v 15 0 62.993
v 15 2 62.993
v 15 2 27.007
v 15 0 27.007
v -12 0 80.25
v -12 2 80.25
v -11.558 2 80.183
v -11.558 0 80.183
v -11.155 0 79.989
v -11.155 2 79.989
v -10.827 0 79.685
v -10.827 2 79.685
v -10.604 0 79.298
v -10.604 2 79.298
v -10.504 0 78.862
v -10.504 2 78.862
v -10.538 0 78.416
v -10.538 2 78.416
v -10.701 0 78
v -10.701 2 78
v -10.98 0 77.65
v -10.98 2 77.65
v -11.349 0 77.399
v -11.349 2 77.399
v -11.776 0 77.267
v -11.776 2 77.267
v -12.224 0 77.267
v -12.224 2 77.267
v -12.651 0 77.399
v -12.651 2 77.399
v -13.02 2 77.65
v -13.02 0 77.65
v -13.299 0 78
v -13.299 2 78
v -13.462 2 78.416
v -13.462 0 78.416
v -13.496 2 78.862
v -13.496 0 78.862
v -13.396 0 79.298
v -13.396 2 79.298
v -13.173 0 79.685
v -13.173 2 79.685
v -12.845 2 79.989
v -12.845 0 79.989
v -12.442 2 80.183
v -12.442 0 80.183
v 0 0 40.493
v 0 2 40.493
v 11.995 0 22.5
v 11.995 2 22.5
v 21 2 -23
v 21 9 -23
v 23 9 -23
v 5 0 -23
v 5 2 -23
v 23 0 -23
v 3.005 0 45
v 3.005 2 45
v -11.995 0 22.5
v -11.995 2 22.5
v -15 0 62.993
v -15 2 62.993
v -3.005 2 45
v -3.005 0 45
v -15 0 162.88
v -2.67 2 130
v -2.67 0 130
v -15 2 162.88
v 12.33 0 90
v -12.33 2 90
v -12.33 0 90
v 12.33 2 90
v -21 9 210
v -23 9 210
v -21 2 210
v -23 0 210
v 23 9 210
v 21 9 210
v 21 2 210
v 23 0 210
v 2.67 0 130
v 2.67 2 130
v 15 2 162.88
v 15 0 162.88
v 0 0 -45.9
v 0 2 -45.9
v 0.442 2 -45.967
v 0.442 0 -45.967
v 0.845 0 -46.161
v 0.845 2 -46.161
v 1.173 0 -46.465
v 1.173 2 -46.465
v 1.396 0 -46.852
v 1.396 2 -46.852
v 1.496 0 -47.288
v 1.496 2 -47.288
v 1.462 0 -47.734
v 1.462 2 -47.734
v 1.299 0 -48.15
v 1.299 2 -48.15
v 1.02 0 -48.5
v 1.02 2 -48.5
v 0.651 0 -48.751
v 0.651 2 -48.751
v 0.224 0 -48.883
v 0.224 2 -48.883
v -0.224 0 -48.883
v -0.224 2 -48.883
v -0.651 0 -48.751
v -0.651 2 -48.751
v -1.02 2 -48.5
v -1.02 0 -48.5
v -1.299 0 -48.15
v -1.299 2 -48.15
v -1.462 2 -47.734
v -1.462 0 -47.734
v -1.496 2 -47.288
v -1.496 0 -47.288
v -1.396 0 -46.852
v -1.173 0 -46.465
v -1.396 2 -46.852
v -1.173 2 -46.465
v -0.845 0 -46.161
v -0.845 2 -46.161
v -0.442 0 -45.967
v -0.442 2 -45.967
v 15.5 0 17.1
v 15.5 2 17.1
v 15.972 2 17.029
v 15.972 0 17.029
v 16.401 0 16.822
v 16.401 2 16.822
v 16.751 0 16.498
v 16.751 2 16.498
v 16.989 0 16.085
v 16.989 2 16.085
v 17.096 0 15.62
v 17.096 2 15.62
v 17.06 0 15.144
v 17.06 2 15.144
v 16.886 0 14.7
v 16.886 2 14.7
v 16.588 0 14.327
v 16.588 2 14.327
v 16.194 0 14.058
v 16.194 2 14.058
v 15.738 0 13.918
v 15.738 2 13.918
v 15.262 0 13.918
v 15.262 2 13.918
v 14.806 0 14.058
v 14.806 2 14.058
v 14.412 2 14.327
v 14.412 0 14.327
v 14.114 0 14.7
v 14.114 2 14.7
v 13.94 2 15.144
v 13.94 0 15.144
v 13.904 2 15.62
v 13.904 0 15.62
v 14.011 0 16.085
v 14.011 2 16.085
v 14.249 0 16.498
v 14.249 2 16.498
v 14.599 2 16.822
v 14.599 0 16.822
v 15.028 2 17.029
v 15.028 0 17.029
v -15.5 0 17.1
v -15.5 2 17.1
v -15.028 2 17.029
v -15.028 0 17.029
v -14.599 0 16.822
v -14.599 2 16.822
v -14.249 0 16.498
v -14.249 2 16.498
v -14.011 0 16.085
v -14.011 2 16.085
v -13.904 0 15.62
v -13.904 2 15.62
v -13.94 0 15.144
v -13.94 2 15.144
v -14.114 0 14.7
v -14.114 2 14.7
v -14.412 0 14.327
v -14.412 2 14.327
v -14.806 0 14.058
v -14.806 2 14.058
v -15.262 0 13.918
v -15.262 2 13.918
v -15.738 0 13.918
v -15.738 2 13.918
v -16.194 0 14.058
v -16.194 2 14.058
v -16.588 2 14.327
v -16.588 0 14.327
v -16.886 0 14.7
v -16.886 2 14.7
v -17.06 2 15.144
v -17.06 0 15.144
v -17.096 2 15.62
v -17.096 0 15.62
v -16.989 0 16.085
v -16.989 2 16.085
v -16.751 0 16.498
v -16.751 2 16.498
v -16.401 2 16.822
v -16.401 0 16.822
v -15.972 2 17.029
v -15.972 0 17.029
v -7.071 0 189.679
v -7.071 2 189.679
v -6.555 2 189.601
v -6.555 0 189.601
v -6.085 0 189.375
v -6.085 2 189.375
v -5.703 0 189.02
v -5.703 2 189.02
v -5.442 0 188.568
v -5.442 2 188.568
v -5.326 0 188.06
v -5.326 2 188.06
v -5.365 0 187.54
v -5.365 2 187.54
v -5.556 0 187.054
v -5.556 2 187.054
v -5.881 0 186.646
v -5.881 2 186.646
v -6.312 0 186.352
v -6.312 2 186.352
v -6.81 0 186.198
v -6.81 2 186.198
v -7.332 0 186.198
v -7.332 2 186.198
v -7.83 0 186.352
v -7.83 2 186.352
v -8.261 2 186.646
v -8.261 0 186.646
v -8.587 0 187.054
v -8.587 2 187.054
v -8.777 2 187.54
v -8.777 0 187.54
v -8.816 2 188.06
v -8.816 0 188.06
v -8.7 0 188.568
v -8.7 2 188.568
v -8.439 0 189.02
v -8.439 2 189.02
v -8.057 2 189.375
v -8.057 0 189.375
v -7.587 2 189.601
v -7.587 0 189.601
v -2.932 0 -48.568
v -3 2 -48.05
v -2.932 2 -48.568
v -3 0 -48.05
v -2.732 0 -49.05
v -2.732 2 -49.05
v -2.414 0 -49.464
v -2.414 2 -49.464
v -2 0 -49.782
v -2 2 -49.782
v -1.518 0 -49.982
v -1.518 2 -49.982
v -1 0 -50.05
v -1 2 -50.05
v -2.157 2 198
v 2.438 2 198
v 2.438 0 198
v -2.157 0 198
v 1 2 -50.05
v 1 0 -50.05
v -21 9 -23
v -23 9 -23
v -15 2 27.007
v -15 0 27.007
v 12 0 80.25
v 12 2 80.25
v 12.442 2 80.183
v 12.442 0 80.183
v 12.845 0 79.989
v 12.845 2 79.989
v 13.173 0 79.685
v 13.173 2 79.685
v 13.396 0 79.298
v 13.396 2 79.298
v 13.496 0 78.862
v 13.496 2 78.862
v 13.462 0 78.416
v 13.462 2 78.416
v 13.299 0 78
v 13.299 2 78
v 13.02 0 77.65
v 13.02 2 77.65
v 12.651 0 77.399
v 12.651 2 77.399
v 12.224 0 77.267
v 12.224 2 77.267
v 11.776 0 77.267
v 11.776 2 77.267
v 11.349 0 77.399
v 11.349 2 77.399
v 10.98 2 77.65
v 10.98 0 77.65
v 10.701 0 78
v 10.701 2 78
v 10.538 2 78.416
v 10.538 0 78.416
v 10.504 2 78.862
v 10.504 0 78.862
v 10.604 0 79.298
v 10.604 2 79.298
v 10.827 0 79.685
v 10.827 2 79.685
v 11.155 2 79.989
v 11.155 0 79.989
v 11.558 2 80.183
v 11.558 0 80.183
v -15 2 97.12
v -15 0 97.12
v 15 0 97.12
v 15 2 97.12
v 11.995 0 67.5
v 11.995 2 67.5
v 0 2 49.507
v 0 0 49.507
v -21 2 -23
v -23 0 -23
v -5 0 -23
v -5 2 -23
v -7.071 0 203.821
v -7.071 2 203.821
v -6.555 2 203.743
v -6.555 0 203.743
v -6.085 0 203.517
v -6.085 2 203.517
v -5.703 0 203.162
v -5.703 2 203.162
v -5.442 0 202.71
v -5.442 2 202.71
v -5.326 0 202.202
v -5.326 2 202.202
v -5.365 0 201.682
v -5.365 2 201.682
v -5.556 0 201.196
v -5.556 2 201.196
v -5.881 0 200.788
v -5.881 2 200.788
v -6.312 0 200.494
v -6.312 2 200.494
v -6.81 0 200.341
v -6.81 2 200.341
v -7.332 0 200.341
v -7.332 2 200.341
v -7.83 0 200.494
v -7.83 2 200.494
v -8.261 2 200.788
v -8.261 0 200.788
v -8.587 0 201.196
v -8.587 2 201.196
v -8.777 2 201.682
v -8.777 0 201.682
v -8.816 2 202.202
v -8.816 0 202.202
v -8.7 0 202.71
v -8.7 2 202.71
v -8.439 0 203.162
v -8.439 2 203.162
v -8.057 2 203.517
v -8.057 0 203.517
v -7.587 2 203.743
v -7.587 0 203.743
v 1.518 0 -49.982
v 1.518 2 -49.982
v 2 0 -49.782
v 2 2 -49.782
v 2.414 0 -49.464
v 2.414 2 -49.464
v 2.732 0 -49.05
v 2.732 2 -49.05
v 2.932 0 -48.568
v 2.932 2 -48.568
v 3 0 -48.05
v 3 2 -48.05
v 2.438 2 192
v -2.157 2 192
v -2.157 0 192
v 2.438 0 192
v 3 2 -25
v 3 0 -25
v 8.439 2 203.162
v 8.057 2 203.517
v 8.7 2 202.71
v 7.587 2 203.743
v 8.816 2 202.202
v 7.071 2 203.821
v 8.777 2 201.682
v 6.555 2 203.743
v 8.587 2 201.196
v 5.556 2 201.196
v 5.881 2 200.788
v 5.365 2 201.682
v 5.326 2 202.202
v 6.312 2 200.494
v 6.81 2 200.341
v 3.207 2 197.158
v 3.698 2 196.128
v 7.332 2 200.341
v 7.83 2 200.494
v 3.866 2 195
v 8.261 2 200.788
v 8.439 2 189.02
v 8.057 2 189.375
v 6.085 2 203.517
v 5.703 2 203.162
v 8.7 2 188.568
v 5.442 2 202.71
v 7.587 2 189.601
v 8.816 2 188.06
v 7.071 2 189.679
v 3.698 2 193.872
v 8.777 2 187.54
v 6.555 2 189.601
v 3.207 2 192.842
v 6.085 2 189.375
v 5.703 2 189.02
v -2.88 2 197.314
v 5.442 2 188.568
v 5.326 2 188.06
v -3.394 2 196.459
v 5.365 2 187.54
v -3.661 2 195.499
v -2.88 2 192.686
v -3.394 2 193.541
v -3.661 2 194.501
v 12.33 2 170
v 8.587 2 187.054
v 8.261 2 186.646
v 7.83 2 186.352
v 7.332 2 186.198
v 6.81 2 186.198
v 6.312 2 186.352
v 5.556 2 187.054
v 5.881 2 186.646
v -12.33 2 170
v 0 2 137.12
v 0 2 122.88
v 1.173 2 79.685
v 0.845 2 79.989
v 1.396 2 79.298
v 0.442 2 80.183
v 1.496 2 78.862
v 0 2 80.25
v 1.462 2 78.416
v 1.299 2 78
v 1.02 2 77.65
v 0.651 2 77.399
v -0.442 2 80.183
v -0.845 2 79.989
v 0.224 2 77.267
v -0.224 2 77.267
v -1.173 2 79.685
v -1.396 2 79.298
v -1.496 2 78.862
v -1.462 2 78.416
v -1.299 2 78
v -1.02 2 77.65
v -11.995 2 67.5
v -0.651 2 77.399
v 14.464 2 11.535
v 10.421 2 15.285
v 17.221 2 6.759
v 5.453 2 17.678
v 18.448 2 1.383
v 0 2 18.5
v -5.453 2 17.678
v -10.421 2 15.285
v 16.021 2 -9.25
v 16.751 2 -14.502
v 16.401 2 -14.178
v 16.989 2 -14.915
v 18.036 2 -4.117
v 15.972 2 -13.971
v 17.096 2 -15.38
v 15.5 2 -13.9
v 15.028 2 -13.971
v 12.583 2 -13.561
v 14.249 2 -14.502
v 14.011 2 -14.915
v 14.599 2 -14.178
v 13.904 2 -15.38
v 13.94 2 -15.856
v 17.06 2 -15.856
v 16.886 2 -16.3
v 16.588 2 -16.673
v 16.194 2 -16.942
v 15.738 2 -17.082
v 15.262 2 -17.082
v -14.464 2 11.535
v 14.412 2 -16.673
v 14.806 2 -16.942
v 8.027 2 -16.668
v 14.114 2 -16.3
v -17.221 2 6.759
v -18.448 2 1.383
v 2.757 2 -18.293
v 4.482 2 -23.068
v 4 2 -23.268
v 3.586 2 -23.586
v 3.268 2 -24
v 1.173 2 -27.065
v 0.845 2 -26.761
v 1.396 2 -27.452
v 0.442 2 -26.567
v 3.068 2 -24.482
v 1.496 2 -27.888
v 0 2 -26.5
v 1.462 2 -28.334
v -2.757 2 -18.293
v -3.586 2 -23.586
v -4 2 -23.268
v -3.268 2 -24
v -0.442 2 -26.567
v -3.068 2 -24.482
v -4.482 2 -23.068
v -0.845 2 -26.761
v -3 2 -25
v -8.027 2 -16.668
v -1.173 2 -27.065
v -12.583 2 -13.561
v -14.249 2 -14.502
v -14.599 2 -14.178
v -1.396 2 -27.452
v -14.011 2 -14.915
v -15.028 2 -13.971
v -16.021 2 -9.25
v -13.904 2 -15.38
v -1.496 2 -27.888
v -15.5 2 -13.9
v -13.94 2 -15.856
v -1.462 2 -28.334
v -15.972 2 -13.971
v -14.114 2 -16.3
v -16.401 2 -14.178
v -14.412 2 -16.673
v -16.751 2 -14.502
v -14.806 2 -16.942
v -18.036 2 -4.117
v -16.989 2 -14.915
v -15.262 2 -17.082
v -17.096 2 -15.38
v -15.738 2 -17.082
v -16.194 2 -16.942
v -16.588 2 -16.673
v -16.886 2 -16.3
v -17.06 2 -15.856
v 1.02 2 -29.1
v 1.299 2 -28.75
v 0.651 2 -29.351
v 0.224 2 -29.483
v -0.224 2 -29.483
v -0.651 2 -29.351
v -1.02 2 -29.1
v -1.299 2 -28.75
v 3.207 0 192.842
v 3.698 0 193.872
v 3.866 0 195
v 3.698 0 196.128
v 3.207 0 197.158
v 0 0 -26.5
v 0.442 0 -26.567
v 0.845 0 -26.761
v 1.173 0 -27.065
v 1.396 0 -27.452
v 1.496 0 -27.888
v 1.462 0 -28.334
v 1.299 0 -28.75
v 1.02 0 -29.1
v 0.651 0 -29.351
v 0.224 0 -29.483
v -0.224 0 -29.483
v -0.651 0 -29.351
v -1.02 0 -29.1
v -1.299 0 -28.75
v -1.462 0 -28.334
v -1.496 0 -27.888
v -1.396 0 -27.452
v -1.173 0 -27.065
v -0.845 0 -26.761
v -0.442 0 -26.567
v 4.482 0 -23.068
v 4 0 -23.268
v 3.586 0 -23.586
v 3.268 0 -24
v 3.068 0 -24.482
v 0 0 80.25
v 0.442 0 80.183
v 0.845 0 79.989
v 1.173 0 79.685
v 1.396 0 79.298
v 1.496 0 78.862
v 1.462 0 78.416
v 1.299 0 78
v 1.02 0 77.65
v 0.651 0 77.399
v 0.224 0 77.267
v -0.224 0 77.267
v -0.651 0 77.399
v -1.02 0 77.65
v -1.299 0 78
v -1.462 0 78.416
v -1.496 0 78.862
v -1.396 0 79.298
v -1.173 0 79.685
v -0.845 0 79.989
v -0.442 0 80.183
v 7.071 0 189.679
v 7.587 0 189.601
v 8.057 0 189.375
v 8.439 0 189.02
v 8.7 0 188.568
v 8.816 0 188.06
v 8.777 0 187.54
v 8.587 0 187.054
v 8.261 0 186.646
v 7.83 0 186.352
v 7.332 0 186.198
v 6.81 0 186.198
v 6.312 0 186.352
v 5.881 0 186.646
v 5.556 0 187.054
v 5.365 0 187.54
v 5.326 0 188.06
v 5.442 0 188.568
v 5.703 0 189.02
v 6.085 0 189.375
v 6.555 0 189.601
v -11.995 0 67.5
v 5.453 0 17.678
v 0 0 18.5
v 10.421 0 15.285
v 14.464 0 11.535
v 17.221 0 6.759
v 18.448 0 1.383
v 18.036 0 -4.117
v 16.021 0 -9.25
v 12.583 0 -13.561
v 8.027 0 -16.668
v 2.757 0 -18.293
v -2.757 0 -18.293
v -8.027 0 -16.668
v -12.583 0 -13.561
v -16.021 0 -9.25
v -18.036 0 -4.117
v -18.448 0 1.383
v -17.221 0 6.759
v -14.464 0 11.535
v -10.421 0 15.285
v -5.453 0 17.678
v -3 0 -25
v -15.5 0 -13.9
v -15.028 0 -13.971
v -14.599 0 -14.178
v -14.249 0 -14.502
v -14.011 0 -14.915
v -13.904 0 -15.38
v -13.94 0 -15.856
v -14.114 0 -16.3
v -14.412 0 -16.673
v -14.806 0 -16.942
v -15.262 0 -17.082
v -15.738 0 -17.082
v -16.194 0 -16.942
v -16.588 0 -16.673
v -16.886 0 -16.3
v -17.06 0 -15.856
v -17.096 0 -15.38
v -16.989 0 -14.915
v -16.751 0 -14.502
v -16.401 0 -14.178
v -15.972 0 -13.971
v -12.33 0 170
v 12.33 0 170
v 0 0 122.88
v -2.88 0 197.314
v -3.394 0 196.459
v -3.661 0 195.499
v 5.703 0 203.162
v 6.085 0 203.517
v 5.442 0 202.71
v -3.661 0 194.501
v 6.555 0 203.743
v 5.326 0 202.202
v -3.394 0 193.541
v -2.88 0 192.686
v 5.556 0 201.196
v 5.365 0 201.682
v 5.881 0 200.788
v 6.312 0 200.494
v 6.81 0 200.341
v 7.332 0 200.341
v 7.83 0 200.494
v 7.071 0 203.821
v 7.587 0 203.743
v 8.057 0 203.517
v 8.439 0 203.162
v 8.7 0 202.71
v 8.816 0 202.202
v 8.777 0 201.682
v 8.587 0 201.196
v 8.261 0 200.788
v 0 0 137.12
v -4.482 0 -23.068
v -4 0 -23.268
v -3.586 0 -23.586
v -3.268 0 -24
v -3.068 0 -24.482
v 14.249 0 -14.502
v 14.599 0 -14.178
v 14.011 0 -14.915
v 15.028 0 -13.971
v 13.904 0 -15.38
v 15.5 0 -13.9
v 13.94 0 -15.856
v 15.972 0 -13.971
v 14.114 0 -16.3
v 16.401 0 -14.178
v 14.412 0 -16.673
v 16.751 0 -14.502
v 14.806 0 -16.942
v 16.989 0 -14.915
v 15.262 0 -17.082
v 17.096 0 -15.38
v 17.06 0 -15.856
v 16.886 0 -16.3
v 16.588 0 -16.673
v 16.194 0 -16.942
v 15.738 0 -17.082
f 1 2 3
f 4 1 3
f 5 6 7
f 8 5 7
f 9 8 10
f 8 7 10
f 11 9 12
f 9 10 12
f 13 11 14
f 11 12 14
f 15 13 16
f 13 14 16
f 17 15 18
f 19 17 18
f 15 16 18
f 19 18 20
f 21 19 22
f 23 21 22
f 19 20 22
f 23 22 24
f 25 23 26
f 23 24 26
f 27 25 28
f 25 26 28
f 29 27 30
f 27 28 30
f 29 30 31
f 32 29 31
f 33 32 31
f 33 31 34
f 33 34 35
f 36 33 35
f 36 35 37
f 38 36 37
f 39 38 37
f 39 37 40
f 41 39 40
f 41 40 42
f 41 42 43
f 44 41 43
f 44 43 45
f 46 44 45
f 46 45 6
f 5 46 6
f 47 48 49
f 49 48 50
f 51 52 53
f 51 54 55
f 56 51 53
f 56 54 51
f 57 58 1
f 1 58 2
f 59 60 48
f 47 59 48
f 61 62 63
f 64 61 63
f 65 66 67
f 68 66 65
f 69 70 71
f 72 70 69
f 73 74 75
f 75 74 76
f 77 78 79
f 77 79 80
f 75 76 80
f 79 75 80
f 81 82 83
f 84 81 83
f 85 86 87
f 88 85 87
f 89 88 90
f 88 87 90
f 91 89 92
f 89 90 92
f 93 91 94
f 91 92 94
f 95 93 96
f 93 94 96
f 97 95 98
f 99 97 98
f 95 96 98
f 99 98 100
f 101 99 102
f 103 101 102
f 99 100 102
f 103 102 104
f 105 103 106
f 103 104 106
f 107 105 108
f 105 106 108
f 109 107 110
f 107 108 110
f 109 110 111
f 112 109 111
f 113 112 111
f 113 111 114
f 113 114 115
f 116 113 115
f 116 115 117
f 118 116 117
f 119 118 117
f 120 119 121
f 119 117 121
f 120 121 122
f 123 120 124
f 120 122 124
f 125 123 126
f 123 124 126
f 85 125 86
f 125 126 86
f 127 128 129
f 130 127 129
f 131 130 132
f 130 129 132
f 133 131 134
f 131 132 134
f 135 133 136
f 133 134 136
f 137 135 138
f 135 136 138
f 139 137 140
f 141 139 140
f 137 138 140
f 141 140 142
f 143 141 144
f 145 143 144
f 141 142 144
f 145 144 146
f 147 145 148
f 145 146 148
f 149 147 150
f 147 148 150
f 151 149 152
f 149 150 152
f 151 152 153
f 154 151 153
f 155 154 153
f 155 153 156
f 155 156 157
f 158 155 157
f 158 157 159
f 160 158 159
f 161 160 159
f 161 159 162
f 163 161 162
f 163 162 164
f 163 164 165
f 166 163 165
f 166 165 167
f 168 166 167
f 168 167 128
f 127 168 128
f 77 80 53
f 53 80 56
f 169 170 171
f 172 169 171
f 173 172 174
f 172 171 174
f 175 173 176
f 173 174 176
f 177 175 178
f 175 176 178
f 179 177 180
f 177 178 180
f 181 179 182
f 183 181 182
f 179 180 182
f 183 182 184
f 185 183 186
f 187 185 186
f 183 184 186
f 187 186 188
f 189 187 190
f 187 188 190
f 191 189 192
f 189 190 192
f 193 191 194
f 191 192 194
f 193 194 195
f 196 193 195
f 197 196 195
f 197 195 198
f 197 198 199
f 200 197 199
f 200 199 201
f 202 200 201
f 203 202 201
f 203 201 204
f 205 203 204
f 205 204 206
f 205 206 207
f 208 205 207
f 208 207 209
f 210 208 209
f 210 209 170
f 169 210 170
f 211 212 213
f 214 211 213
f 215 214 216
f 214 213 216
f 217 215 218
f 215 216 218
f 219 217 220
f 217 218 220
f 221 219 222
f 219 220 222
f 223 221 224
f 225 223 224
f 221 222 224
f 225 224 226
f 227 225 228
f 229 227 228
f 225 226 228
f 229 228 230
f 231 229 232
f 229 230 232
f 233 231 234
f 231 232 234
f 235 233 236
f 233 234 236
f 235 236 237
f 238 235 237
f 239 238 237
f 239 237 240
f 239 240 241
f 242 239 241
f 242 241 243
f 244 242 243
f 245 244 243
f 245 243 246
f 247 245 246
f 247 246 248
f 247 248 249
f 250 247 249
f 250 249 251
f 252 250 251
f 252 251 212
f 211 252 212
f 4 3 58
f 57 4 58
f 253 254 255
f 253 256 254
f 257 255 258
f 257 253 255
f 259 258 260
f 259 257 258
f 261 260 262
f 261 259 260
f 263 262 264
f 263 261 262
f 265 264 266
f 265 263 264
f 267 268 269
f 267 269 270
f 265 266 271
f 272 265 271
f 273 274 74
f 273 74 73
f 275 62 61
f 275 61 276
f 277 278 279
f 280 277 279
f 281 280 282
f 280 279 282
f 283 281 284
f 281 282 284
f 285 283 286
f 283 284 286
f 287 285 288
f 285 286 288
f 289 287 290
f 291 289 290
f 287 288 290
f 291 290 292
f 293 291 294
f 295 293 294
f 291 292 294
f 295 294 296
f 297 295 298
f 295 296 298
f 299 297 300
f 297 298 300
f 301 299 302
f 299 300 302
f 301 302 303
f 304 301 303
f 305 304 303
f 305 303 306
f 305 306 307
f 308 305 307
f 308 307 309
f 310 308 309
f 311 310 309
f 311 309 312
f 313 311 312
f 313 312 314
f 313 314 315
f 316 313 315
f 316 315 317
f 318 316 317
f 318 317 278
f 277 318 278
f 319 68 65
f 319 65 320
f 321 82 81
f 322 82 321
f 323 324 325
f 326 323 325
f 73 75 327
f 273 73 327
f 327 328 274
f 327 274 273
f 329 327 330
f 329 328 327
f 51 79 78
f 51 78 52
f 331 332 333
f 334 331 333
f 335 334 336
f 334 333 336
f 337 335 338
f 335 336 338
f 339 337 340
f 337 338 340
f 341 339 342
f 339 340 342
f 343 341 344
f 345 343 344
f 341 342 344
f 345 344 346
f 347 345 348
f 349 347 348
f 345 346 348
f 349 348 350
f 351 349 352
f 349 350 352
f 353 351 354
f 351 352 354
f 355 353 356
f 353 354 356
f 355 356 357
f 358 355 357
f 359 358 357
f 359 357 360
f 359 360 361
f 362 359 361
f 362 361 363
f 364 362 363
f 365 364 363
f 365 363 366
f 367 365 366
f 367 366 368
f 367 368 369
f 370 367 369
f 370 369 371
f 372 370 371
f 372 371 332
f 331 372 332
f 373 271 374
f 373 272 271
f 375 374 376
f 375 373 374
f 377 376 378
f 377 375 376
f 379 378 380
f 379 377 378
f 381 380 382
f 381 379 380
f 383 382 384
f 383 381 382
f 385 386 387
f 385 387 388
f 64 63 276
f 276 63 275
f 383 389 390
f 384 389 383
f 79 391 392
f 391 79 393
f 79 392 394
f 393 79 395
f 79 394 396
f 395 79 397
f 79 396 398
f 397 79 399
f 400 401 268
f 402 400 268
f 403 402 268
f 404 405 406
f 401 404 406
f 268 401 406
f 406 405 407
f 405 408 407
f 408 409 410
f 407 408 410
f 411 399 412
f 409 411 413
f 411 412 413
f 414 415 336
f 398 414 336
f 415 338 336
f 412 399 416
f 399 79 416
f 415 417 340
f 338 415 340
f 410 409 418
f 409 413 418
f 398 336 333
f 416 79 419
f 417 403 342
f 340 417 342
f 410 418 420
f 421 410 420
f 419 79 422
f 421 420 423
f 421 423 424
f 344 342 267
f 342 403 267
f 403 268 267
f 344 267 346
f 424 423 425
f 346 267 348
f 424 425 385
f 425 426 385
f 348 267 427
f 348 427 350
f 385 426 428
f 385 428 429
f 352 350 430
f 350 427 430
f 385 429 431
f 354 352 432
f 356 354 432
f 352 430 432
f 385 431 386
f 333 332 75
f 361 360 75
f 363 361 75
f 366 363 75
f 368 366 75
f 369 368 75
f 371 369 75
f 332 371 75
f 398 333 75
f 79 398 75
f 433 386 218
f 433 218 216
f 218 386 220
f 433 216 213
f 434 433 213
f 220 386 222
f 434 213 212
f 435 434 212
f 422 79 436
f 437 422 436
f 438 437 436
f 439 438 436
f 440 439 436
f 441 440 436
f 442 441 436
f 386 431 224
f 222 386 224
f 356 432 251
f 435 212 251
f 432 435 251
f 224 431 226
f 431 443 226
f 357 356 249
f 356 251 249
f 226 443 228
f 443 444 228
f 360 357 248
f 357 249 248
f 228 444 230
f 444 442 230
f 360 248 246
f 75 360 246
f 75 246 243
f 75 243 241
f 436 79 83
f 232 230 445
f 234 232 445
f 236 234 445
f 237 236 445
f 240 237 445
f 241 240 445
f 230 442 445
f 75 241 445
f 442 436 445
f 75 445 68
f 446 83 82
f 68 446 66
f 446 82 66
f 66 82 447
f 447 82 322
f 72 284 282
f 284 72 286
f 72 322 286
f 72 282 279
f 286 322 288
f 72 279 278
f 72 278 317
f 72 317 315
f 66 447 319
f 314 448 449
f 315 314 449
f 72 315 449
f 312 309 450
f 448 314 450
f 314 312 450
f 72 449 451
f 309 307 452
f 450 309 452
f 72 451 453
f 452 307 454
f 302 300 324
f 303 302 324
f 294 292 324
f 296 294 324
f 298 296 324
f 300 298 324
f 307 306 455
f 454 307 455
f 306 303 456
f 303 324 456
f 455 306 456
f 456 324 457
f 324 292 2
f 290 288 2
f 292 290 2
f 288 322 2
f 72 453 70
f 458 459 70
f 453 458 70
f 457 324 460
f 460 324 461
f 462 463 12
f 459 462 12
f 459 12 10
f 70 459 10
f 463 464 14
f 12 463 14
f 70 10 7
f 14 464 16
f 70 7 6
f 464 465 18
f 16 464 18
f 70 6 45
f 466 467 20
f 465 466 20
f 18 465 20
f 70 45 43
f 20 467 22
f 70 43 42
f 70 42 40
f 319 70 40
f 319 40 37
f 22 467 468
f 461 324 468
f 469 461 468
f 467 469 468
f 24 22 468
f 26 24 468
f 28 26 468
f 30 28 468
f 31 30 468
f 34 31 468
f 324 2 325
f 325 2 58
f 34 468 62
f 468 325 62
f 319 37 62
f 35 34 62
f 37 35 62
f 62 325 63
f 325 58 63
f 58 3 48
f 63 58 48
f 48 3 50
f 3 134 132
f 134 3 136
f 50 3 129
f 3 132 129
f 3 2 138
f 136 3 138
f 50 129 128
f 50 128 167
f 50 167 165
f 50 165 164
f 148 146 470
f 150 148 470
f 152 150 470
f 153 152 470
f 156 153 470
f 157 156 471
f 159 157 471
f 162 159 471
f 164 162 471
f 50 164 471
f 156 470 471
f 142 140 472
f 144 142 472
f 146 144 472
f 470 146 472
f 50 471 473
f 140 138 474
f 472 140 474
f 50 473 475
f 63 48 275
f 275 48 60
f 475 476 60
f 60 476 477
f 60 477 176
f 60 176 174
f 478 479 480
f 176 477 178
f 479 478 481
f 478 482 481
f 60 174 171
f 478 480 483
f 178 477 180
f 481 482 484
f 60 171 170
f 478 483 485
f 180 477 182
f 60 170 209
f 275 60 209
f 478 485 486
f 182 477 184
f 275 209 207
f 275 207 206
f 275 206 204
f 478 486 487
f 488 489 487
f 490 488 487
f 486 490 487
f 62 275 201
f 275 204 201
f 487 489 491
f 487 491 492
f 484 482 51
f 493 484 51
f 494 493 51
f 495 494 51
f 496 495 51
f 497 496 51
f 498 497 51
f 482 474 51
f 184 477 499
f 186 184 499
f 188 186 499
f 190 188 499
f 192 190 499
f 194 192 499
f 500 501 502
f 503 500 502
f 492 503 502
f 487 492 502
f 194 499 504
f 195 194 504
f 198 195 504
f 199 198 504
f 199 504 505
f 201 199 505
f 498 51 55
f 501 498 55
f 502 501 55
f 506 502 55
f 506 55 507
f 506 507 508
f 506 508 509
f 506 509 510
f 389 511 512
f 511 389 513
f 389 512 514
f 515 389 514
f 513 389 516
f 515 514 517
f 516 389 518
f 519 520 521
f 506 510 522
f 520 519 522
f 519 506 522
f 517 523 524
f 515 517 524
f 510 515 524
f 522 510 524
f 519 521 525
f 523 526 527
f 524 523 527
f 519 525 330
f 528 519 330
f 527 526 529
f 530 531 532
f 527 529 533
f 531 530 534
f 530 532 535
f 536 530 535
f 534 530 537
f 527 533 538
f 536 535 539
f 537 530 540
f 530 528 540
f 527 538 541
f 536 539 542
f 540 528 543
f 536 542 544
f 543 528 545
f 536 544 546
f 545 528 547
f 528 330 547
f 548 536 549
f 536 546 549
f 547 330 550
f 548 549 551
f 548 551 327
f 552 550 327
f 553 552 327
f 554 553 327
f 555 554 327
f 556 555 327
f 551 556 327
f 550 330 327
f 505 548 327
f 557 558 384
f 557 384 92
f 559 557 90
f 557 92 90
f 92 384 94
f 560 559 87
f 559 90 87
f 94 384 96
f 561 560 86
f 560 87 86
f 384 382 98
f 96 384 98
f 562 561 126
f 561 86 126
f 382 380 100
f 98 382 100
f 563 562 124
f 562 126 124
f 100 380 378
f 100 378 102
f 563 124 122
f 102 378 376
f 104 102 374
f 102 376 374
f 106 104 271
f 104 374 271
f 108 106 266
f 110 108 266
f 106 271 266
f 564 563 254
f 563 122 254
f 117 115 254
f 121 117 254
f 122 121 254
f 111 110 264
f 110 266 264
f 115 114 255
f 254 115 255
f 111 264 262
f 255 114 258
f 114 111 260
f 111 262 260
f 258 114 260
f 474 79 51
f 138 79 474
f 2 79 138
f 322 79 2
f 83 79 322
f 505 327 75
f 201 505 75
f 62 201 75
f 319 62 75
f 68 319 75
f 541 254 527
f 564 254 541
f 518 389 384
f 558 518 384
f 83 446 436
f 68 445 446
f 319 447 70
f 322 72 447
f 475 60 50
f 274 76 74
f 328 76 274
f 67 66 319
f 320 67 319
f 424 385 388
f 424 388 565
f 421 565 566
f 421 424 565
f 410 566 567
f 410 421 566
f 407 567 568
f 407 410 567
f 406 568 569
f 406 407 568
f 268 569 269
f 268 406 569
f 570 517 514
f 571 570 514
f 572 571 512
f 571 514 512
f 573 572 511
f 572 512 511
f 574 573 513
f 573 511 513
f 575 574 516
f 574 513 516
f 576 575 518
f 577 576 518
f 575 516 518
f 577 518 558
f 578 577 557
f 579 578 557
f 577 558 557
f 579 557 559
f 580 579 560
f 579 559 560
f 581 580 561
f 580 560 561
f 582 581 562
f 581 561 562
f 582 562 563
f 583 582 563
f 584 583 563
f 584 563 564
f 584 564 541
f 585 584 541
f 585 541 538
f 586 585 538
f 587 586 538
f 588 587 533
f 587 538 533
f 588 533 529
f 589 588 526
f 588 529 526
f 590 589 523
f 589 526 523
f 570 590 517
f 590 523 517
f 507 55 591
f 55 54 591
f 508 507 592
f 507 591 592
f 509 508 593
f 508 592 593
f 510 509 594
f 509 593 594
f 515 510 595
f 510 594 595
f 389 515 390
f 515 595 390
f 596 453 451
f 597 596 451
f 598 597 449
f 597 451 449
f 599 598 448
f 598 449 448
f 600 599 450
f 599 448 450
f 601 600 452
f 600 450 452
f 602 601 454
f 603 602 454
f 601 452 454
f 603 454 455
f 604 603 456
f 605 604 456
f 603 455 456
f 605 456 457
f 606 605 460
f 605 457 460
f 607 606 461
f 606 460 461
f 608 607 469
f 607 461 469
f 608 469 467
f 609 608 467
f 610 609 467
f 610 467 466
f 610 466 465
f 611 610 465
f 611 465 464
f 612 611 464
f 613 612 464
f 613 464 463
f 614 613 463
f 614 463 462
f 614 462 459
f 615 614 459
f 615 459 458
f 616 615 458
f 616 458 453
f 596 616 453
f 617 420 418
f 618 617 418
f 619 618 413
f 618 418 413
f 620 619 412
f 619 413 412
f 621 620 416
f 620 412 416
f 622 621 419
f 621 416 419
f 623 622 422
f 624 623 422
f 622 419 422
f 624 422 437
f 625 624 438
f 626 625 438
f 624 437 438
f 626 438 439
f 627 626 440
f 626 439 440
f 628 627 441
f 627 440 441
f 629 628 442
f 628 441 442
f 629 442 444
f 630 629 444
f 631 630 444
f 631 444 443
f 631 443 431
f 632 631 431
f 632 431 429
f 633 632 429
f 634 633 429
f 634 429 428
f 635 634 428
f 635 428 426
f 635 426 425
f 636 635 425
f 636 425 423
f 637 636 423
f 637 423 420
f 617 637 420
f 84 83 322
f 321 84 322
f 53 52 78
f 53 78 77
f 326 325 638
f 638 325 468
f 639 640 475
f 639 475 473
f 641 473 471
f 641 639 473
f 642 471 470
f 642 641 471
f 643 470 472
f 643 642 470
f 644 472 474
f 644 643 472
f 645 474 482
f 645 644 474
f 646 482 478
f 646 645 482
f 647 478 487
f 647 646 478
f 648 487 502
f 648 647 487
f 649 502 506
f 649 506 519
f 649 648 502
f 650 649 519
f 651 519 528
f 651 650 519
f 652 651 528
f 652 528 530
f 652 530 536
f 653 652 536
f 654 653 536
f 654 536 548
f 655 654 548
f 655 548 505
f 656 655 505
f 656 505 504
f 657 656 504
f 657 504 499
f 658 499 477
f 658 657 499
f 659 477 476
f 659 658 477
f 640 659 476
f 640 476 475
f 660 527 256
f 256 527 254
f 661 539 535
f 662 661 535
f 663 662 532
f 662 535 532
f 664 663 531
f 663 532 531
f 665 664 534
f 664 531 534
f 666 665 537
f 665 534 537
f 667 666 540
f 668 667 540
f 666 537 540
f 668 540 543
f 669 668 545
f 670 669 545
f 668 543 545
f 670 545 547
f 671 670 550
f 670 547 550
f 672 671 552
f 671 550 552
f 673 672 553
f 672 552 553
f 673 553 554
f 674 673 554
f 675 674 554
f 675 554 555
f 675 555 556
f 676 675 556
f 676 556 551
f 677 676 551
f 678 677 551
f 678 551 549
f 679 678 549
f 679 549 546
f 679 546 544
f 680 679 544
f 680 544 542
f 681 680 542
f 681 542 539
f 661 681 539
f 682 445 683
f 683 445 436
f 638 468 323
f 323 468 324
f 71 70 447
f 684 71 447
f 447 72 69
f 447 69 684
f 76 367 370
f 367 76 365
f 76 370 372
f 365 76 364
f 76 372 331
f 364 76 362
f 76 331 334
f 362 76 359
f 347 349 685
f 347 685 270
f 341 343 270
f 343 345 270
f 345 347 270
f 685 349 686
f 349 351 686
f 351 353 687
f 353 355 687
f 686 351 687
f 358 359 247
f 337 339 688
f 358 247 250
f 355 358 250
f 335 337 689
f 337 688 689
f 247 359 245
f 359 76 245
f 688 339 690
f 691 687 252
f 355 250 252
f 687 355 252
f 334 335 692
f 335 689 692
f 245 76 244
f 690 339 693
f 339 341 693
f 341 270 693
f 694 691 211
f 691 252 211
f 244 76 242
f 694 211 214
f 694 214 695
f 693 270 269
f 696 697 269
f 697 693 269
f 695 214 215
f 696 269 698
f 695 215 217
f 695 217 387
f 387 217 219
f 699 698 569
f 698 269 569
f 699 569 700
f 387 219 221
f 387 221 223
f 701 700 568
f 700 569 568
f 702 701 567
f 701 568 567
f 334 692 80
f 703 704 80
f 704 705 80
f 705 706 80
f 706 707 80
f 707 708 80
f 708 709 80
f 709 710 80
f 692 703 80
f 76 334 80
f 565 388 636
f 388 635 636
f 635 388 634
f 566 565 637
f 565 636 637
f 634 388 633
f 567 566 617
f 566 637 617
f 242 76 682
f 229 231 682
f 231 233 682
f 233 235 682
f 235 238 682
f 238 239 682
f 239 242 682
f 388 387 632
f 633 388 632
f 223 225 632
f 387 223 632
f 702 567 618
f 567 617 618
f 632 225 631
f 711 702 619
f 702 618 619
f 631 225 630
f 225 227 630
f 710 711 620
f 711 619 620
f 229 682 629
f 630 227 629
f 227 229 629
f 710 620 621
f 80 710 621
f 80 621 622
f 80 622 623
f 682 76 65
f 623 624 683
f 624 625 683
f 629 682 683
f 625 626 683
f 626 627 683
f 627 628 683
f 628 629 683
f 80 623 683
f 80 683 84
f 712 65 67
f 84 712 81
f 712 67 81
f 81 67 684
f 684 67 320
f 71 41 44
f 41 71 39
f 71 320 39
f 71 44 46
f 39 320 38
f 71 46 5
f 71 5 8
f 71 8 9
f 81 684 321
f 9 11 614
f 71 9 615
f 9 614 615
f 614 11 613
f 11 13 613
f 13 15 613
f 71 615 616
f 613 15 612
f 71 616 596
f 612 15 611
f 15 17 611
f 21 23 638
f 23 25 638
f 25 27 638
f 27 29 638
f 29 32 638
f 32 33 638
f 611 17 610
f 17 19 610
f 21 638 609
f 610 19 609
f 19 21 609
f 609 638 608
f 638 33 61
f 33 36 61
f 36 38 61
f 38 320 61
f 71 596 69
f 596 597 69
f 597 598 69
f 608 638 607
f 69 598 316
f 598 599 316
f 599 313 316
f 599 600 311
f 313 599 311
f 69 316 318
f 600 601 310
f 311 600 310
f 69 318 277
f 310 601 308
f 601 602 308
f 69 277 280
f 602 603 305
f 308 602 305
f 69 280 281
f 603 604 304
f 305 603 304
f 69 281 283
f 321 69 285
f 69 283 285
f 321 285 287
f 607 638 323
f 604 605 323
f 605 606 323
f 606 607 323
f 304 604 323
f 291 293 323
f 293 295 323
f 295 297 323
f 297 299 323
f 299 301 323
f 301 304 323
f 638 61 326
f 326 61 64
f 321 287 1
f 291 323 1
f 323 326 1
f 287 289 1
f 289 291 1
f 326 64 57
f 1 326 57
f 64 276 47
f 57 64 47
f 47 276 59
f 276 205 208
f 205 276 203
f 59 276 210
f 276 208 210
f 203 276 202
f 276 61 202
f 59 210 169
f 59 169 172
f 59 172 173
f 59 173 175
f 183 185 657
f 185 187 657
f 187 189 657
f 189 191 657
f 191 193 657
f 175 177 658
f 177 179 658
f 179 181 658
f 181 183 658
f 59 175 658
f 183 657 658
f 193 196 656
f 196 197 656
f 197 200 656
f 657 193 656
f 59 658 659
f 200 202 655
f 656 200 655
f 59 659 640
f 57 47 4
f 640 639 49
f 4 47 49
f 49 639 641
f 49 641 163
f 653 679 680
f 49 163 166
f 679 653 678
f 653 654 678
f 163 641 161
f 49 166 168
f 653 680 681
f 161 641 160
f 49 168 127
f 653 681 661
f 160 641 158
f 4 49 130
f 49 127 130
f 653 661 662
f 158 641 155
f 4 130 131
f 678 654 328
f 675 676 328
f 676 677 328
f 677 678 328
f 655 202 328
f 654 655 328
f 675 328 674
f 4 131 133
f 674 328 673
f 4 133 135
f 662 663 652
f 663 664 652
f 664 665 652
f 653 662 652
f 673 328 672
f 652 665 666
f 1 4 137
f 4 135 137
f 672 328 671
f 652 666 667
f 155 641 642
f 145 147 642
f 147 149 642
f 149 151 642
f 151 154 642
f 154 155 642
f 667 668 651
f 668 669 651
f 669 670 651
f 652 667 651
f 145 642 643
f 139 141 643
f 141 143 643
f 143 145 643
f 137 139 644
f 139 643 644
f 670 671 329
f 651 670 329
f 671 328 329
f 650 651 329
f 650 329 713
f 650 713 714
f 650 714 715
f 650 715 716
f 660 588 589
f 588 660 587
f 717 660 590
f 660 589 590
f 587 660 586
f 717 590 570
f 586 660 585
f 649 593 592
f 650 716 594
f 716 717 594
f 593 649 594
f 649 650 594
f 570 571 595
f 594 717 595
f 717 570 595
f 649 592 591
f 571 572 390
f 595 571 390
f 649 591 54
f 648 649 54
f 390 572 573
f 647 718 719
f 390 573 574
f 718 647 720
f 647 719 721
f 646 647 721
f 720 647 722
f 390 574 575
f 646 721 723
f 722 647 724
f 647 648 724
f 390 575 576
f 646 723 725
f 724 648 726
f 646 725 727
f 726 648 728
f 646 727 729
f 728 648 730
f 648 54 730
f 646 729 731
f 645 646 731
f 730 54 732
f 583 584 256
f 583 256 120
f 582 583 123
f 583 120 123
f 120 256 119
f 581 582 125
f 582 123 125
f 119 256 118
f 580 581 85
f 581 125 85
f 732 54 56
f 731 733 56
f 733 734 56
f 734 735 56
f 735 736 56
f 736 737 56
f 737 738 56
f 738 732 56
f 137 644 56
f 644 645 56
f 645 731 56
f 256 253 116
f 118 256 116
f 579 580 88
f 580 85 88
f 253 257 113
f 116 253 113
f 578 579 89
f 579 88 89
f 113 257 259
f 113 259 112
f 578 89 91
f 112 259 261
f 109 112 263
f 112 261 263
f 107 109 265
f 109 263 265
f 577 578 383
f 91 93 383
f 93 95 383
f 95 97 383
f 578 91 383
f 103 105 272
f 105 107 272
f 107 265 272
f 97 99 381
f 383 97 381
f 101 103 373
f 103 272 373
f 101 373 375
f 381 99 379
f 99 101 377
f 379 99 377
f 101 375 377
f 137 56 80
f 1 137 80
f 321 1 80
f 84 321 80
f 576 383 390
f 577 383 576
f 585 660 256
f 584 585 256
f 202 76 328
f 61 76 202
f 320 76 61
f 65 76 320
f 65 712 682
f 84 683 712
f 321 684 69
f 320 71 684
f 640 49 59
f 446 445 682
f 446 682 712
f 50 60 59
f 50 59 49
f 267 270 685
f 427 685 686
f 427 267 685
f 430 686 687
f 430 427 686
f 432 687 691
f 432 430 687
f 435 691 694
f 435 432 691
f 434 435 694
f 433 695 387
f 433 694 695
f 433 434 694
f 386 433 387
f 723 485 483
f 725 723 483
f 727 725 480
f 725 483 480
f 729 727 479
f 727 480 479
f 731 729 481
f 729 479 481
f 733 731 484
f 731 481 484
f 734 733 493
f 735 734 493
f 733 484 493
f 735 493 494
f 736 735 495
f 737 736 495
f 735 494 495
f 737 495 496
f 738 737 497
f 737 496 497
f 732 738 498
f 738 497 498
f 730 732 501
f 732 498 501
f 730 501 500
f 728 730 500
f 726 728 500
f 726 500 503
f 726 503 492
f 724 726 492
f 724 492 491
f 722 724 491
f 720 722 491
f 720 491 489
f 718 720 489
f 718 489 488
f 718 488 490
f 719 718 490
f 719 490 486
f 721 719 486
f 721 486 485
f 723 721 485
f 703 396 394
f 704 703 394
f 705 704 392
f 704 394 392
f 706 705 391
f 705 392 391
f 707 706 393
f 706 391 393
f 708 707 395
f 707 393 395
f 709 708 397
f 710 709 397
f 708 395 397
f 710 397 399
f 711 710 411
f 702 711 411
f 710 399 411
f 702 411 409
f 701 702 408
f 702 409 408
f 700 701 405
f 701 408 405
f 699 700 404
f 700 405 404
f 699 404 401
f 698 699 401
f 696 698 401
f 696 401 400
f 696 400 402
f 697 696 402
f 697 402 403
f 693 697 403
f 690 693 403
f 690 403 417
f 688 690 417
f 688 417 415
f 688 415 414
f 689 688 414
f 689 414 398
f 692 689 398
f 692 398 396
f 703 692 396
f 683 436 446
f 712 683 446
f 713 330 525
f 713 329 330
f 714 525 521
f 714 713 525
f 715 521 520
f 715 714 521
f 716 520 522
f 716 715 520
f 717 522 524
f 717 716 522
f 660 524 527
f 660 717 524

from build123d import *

# Parameters (mm, degrees)
SKETCH_2_W           = 42
SKETCH_2_H           = 46
SKETCH_2_R           = 18.5
EXTRUDE_1_DEPTH      = 2
SKETCH_3_R           = 1.6
CUT_EXTRUDE_1_DEPTH  = 32.208973069
SKETCH_4_W           = 42
SKETCH_4_H           = 187
EXTRUDE_2_DEPTH      = 2
SKETCH_7_W           = 6
SKETCH_7_H           = 27.05
SKETCH_7_R           = 1.5
EXTRUDE_4_DEPTH      = 2
FILLET_3_R           = 2
SKETCH_5_R           = 1.75
CUT_EXTRUDE_2_DEPTH  = 212.056864375
SKETCH_9_W           = 30
SKETCH_9_H           = 80
SKETCH_9_H_2         = 45
CUT_EXTRUDE_4_DEPTH  = 212.056864375
EXTRUDE_5_DEPTH      = 2
EXTRUDE_6_DEPTH      = 2
EXTRUDE_7_DEPTH      = 7
EXTRUDE_7_DEPTH_BACK = 2
SKETCH_13_W          = 2
SKETCH_13_H          = 233
SKETCH_15_R          = 1.5
CUT_EXTRUDE_5_DEPTH  = 212.371710501


with BuildPart() as part:
    # 草图2 → 凸台-拉伸1 (new body)
    with BuildSketch(Plane(origin=(0, 0, 0), x_dir=(1, 0, 0), z_dir=(0, 1, 0))):
        Rectangle(SKETCH_2_W, SKETCH_2_H)
        Circle(SKETCH_2_R, mode=Mode.SUBTRACT)
    extrude(amount=EXTRUDE_1_DEPTH)

    # 草图3 → 切除-拉伸1 (cut, through all)
    with BuildSketch(Plane(origin=(0, 2, 0), x_dir=(1, 0, 0), z_dir=(0, 1, 0))):
        with Locations((-15.5, 15.5)):
            Circle(SKETCH_3_R)
        with Locations((15.5, 15.5)):
            Circle(SKETCH_3_R)
        with Locations((-15.5, -15.5)):
            Circle(SKETCH_3_R)
        with Locations((15.5, -15.5)):
            Circle(SKETCH_3_R)
    extrude(amount=-CUT_EXTRUDE_1_DEPTH, mode=Mode.SUBTRACT)

    # 草图4 → 凸台-拉伸2 (add)
    with BuildSketch(Plane(origin=(0, 2, 0), x_dir=(1, 0, 0), z_dir=(0, 1, 0))):
        with Locations((0, -116.5)):
            Rectangle(SKETCH_4_W, SKETCH_4_H)
    extrude(amount=-EXTRUDE_2_DEPTH)

    # 草图7 → 凸台-拉伸4 (add)
    with BuildSketch(Plane(origin=(0, 2, 0), x_dir=(1, 0, 0), z_dir=(0, 1, 0))):
        with Locations((0, 36.525)):
            Rectangle(SKETCH_7_W, SKETCH_7_H)
        with Locations((0, 47.4)):
            Circle(SKETCH_7_R, mode=Mode.SUBTRACT)
        with Locations((0, 28)):
            Circle(SKETCH_7_R, mode=Mode.SUBTRACT)
    extrude(amount=-EXTRUDE_4_DEPTH)

    # 圆角3
    fillet_3_edges = [part.edges().sort_by_distance(p)[0] for p in [
        (3, 1, -23),
        (3, 1, -50.05),
        (-3, 1, -23),
        (-3, 1, -50.05),
    ]]
    fillet(fillet_3_edges, radius=FILLET_3_R)

    # 草图5 → 切除-拉伸2 (cut, through all)
    with BuildSketch(Plane(origin=(0, 2, 0), x_dir=(1, 0, 0), z_dir=(0, 1, 0))):
        with Locations((-7.071067812, -202.071067812)):
            Circle(SKETCH_5_R)
        with Locations((7.071067812, -202.071067812)):
            Circle(SKETCH_5_R)
        with Locations((-7.071067812, -187.928932188)):
            Circle(SKETCH_5_R)
        with Locations((7.071067812, -187.928932188)):
            Circle(SKETCH_5_R)
        with BuildLine():
            Line((-2.156670728, -192), (2.438064686, -192))
            ThreePointArc((2.438064686, -192), (3.865767636, -195), (2.438064686, -198))
            Line((2.438064686, -198), (-2.156670728, -198))
            ThreePointArc((-2.156670728, -198), (-3.694756911, -195), (-2.156670728, -192))
        make_face()
    extrude(amount=-CUT_EXTRUDE_2_DEPTH, mode=Mode.SUBTRACT)

    # 草图9 → 切除-拉伸4 (cut, through all)
    with BuildSketch(Plane(origin=(0, 2, 0), x_dir=(1, 0, 0), z_dir=(0, 1, 0))):
        with Locations((0, -130)):
            Rectangle(SKETCH_9_W, SKETCH_9_H)
        with Locations((0, -45)):
            Rectangle(SKETCH_9_W, SKETCH_9_H_2)
    extrude(amount=-CUT_EXTRUDE_4_DEPTH, mode=Mode.SUBTRACT)

    # 草图10 → 凸台-拉伸5 (add)
    with BuildSketch(Plane(origin=(0, 2, 0), x_dir=(1, 0, 0), z_dir=(0, 1, 0))):
        Polygon((12.919874264, -68.886750491), (-17.080125736, -23.886750491), (-12.919874264, -21.113249509), (17.080125736, -66.113249509), align=None)
        Polygon((12.659177056, -170.877808604), (-17.340822944, -90.877808604), (-12.659177056, -89.122191396), (17.340822944, -169.122191396), align=None)
    extrude(amount=-EXTRUDE_5_DEPTH)

    # 草图11 → 凸台-拉伸6 (add)
    with BuildSketch(Plane(origin=(0, 2, 0), x_dir=(1, 0, 0), z_dir=(0, 1, 0))):
        Polygon((-17.080125736, -66.113249509), (12.919874264, -21.113249509), (17.080125736, -23.886750491), (-12.919874264, -68.886750491), align=None)
        Polygon((-12.659177056, -170.877808604), (17.340822944, -90.877808604), (12.659177056, -89.122191396), (-17.340822944, -169.122191396), align=None)
    extrude(amount=-EXTRUDE_6_DEPTH)

    # 草图13 → 凸台-拉伸7 (add, two sides: drawn at the far end of the back side and taken through both)
    with BuildSketch(Plane(origin=(0, 2, 0), x_dir=(1, 0, 0), z_dir=(0, 1, 0)).offset(-EXTRUDE_7_DEPTH_BACK)):
        with Locations((22, -93.5)):
            Rectangle(SKETCH_13_W, SKETCH_13_H)
        with Locations((-22, -93.5)):
            Rectangle(SKETCH_13_W, SKETCH_13_H)
    extrude(amount=EXTRUDE_7_DEPTH + EXTRUDE_7_DEPTH_BACK)

    # 草图15 → 切除-拉伸5 (cut, through all)
    with BuildSketch(Plane(origin=(0, 2, 0), x_dir=(1, 0, 0), z_dir=(0, 1, 0))):
        with Locations((0, -78.75)):
            Circle(SKETCH_15_R)
        with Locations((-12, -78.75)):
            Circle(SKETCH_15_R)
        with Locations((12, -78.75)):
            Circle(SKETCH_15_R)
    extrude(amount=-CUT_EXTRUDE_5_DEPTH, mode=Mode.SUBTRACT)


solid = part.part
